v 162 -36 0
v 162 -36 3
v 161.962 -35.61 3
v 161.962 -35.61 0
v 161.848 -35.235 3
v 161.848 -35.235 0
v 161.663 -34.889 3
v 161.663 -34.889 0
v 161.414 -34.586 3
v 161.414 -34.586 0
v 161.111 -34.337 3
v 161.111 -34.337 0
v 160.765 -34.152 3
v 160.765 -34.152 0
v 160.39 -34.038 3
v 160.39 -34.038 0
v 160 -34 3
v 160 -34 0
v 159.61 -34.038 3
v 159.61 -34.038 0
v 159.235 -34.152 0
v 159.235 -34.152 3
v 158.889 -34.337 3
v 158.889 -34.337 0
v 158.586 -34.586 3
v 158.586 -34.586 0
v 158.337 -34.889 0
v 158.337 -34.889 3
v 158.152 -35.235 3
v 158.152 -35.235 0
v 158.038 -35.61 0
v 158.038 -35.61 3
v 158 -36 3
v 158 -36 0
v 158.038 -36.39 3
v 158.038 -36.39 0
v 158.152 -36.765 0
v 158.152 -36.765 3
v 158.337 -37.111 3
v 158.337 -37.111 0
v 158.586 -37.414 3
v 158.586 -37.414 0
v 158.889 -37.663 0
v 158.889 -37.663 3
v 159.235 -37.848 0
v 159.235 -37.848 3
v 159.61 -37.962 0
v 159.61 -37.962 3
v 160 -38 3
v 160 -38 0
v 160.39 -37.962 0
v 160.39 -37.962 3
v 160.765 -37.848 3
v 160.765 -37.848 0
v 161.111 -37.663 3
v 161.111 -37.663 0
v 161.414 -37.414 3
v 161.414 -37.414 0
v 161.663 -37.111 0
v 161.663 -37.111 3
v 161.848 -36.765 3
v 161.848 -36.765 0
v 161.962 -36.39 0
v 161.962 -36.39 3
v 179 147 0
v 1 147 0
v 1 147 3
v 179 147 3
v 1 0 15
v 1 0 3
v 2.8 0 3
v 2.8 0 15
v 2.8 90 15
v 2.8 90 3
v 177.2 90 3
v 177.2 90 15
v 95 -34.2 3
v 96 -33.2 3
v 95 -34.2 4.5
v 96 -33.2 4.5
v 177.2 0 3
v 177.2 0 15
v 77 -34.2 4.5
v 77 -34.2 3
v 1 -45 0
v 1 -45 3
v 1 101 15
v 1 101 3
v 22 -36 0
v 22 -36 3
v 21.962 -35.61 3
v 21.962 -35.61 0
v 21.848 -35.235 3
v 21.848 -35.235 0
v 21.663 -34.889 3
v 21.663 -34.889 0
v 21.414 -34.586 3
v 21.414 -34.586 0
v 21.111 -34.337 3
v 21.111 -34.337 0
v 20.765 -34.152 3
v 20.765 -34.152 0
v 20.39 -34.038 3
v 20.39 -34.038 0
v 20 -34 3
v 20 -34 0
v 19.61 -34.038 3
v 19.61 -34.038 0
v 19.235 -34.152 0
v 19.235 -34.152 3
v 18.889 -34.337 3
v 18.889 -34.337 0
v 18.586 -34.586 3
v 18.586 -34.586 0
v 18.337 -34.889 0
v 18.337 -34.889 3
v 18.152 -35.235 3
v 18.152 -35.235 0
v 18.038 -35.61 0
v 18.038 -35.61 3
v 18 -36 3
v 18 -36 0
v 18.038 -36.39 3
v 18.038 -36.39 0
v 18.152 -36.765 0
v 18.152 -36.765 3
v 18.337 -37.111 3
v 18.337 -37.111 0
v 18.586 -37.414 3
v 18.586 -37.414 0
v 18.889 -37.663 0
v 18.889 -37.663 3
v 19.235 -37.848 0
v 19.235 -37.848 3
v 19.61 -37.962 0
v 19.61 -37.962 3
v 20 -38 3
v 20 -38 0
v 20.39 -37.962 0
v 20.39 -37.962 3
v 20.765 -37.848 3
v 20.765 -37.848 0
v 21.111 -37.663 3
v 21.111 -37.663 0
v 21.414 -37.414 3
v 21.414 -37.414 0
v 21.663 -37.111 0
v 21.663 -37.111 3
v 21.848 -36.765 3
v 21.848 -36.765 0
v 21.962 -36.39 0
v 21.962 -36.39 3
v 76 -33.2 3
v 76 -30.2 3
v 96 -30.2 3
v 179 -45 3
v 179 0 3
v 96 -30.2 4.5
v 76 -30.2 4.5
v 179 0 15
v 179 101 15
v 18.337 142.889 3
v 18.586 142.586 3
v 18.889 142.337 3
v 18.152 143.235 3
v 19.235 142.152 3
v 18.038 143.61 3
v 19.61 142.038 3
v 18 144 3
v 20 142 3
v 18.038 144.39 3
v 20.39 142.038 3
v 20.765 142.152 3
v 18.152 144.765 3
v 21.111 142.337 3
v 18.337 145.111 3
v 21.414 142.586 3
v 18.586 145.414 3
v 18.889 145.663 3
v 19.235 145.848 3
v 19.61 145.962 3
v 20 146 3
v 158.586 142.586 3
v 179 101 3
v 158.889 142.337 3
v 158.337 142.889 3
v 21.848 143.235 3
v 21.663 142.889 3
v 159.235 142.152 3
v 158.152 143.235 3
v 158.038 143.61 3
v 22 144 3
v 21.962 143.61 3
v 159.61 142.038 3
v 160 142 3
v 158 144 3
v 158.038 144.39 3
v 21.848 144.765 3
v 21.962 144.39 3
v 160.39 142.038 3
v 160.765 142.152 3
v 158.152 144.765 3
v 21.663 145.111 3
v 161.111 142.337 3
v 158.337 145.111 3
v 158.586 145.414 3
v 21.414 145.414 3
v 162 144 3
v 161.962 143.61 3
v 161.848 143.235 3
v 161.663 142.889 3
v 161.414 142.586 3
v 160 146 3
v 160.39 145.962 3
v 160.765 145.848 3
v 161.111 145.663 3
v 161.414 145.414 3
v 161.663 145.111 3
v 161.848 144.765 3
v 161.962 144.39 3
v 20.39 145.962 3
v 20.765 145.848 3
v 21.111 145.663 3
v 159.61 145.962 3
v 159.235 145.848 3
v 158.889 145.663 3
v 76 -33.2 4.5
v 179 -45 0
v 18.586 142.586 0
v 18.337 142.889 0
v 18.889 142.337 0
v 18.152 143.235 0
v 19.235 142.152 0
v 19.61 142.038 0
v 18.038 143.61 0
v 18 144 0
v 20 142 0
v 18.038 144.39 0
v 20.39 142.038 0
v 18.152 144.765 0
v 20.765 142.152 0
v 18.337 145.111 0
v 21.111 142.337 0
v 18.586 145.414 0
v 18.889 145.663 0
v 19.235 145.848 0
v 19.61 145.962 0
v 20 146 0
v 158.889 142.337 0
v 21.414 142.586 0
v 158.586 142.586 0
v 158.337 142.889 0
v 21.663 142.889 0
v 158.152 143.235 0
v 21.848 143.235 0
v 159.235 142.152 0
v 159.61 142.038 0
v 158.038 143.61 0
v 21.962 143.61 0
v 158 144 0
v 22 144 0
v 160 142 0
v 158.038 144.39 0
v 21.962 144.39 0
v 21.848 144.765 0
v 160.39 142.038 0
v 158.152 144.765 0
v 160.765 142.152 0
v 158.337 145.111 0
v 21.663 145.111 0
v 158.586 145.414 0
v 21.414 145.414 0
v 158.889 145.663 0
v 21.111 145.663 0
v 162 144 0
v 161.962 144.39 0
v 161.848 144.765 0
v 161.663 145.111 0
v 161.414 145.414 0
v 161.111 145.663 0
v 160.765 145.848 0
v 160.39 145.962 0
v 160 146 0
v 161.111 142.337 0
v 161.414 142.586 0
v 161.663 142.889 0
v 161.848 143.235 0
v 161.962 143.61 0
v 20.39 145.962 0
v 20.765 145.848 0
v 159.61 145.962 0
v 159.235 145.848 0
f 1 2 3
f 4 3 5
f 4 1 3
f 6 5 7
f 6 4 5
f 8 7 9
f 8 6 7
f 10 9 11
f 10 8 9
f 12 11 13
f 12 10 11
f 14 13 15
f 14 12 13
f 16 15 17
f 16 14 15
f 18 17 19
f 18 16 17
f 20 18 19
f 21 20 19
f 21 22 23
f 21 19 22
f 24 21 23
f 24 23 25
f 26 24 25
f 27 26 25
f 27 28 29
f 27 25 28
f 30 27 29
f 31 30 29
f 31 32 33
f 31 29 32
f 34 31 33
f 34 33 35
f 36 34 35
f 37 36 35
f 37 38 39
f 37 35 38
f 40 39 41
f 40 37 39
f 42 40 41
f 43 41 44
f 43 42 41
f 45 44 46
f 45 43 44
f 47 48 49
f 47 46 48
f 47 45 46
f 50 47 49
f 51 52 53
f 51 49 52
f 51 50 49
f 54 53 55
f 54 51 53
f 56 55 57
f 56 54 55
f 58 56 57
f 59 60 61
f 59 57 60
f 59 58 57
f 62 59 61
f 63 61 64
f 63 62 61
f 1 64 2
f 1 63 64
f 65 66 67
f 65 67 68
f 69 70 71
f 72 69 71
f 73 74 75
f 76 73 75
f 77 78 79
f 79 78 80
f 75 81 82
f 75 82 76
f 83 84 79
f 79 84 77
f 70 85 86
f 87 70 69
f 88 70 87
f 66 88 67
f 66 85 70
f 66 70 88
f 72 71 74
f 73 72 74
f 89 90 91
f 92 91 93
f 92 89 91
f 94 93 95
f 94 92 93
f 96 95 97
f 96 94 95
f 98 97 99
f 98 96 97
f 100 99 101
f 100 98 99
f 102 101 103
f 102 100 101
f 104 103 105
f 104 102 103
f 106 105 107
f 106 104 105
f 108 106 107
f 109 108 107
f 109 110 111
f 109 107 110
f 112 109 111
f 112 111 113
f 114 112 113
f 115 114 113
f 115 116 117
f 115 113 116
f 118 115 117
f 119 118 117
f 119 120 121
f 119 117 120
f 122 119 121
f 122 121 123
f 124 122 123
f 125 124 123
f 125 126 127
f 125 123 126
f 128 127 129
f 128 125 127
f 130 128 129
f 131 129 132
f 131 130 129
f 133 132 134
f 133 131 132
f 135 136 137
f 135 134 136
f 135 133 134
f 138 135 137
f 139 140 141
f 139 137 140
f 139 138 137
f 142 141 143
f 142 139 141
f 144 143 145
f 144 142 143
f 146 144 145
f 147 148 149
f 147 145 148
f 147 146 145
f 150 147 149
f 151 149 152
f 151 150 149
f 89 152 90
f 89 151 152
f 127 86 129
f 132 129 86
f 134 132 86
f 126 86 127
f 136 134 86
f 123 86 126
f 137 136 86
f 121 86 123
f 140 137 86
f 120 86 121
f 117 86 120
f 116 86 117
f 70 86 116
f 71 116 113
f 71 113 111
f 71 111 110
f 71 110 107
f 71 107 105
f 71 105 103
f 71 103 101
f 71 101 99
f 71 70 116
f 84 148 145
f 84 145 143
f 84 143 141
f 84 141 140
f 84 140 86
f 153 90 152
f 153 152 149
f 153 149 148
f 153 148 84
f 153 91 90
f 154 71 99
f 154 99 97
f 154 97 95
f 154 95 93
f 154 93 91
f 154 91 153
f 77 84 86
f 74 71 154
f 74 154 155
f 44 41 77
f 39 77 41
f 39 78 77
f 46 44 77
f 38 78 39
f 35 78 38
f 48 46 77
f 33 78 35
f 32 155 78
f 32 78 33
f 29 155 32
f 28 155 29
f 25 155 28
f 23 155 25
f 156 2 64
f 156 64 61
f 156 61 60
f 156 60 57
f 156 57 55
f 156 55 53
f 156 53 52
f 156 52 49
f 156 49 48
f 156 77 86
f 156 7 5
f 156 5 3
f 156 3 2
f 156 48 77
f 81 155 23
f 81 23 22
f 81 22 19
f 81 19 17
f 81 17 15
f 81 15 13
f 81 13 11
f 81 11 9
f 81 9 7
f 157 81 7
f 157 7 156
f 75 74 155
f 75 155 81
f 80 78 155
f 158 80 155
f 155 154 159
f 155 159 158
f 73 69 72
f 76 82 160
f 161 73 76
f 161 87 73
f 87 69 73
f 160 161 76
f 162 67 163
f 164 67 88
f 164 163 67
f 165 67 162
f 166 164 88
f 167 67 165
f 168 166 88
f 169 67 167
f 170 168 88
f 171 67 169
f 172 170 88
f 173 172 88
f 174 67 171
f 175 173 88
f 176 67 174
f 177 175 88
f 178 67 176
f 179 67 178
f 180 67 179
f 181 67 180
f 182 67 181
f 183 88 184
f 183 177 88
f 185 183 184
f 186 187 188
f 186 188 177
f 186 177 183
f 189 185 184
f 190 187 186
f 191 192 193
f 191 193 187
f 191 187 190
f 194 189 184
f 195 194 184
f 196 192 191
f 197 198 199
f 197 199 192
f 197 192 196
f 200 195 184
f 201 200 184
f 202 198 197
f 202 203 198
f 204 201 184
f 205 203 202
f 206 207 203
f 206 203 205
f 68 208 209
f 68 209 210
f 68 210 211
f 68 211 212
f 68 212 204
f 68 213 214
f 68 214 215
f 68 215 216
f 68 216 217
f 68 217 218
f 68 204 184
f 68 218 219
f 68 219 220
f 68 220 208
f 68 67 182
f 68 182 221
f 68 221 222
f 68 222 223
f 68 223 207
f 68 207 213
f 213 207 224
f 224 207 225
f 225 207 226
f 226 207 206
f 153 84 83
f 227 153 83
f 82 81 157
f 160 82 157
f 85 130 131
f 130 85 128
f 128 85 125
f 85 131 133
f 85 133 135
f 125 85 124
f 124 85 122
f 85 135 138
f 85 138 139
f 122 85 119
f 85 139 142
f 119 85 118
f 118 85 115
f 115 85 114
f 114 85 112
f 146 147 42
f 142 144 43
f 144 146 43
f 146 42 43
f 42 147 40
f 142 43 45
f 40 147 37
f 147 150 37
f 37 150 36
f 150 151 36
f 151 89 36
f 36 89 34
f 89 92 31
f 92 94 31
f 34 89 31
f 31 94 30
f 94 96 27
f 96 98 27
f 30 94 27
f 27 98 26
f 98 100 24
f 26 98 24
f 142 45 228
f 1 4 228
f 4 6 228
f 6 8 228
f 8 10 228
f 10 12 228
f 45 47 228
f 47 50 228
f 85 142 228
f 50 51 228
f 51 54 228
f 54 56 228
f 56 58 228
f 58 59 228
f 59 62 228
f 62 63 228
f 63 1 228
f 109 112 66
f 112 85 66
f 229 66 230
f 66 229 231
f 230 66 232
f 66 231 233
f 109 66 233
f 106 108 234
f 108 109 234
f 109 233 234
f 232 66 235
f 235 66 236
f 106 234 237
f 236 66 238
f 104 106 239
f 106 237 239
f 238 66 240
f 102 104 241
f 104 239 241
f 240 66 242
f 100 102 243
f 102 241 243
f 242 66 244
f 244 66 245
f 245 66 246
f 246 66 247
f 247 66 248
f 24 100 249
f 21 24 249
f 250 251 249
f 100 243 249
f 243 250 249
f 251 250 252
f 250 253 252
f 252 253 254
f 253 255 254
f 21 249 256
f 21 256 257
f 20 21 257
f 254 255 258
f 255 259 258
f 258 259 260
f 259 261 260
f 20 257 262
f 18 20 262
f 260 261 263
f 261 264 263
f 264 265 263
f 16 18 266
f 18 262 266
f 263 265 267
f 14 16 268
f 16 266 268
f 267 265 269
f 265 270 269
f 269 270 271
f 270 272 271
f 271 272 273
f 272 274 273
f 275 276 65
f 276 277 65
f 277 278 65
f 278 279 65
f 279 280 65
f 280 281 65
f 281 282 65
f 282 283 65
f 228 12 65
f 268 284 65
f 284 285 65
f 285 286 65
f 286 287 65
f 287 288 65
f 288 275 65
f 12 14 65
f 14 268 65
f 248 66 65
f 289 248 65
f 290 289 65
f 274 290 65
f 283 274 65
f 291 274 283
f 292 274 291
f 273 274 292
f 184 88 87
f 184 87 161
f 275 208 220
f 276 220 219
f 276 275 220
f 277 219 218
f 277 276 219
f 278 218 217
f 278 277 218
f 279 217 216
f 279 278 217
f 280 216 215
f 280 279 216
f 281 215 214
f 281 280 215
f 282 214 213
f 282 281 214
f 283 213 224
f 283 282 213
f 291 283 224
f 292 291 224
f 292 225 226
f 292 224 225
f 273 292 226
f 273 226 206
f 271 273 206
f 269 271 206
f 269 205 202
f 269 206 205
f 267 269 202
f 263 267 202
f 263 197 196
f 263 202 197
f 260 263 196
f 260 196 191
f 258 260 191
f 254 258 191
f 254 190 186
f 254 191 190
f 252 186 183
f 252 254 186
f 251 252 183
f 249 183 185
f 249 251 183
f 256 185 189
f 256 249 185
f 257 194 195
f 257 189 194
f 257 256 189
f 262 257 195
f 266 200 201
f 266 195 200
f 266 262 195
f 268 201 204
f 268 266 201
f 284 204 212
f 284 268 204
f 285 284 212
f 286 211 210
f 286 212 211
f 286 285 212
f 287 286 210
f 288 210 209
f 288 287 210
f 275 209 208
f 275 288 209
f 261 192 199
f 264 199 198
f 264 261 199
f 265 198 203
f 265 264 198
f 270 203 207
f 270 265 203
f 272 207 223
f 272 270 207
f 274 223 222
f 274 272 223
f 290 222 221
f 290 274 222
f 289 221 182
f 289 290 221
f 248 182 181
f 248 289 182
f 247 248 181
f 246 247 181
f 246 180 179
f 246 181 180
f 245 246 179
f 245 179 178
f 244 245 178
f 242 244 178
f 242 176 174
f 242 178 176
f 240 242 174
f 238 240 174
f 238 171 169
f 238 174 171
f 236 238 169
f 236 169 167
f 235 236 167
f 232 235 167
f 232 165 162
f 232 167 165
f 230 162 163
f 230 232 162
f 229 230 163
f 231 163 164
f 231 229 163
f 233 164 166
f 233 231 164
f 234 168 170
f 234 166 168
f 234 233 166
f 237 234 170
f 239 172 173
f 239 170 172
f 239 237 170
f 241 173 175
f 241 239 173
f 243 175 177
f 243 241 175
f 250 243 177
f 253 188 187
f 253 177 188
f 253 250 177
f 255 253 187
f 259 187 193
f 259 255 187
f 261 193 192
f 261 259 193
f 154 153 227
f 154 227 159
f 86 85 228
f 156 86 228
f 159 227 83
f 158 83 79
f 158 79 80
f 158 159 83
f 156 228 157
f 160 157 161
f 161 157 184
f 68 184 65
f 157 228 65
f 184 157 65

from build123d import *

# Parameters (mm, degrees)
CYLINDER028_R     = 2
CYLINDER028_DEPTH = 10
CYLINDER029_R     = 2
CYLINDER029_DEPTH = 10
CYLINDER030_R     = 2
CYLINDER030_DEPTH = 10
CYLINDER031_R     = 2
CYLINDER031_DEPTH = 10
BOX014_W          = 20
BOX014_H          = 4
BOX014_DEPTH      = 1.5
CHAMFER002_SIZE   = 1
BOX013_W          = 178
BOX013_H          = 11
BOX013_DEPTH      = 12
BOX011_W          = 1.8
BOX011_H          = 98
BOX011_DEPTH      = 12
BOX012_W          = 1.8
BOX012_H          = 98
BOX012_DEPTH      = 12
BOX005_W          = 178
BOX005_H          = 192
BOX005_DEPTH      = 3


with BuildPart() as cilindro007:
    # Cylinder028 → Cylinder028 (new body)
    with BuildSketch(Plane(origin=(20, 144, 0), x_dir=(1, 0, 0), z_dir=(0, 0, 1))):
        Circle(CYLINDER028_R)
    extrude(amount=CYLINDER028_DEPTH)


with BuildPart() as cilindro008:
    # Cylinder029 → Cylinder029 (new body)
    with BuildSketch(Plane(origin=(160, -36, 0), x_dir=(1, 0, 0), z_dir=(0, 0, 1))):
        Circle(CYLINDER029_R)
    extrude(amount=CYLINDER029_DEPTH)


with BuildPart() as cilindro009:
    # Cylinder030 → Cylinder030 (new body)
    with BuildSketch(Plane(origin=(20, -36, 0), x_dir=(1, 0, 0), z_dir=(0, 0, 1))):
        Circle(CYLINDER030_R)
    extrude(amount=CYLINDER030_DEPTH)


with BuildPart() as cilindro010:
    # Cylinder031 → Cylinder031 (new body)
    with BuildSketch(Plane(origin=(160, 144, 0), x_dir=(1, 0, 0), z_dir=(0, 0, 1))):
        Circle(CYLINDER031_R)
    extrude(amount=CYLINDER031_DEPTH)


with BuildPart() as chamfer002:
    # Box014 → Box014 (new body)
    with BuildSketch(Plane(origin=(76, -34.2, 3), x_dir=(1, 0, 0), z_dir=(0, 0, 1))):
        with Locations((10, 2)):
            Rectangle(BOX014_W, BOX014_H)
    extrude(amount=BOX014_DEPTH)

    # Chamfer002
    chamfer002_edges = [chamfer002.edges().sort_by_distance(p)[0] for p in [
        (76, -34.2, 3.75),
        (96, -34.2, 3.75),
    ]]
    chamfer(chamfer002_edges, length=CHAMFER002_SIZE)


with BuildPart() as cubo009:
    # Box013 → Box013 (new body)
    with BuildSketch(Plane(origin=(1, 90, 3), x_dir=(1, 0, 0), z_dir=(0, 0, 1))):
        with Locations((89, 5.5)):
            Rectangle(BOX013_W, BOX013_H)
    extrude(amount=BOX013_DEPTH)


with BuildPart() as fusion011:
    # Box011 → Box011 (new body)
    with BuildSketch(Plane(origin=(1, 0, 3), x_dir=(1, 0, 0), z_dir=(0, 0, 1))):
        with Locations((0.9, 49)):
            Rectangle(BOX011_W, BOX011_H)
    extrude(amount=BOX011_DEPTH)

    # Fusion011: union Cubo009
    add(cubo009.part)


with BuildPart() as fusion012:
    # Box012 → Box012 (new body)
    with BuildSketch(Plane(origin=(177.2, 0, 3), x_dir=(1, 0, 0), z_dir=(0, 0, 1))):
        with Locations((0.9, 49)):
            Rectangle(BOX012_W, BOX012_H)
    extrude(amount=BOX012_DEPTH)

    # Fusion012: union Fusion011
    add(fusion011.part)


with BuildPart() as cut049:
    # Box005 → Box005 (new body)
    with BuildSketch(Plane(origin=(1, -45, 0), x_dir=(1, 0, 0), z_dir=(0, 0, 1))):
        with Locations((89, 96)):
            Rectangle(BOX005_W, BOX005_H)
    extrude(amount=BOX005_DEPTH)

    # Fusion013: union Fusion012
    add(fusion012.part)

    # Fusion014: union Chamfer002
    add(chamfer002.part)

    # Cut046: cut Cilindro010
    add(cilindro010.part, mode=Mode.SUBTRACT)

    # Cut047: cut Cilindro009
    add(cilindro009.part, mode=Mode.SUBTRACT)

    # Cut048: cut Cilindro008
    add(cilindro008.part, mode=Mode.SUBTRACT)

    # Cut049: cut Cilindro007
    add(cilindro007.part, mode=Mode.SUBTRACT)


solid = cut049.part
